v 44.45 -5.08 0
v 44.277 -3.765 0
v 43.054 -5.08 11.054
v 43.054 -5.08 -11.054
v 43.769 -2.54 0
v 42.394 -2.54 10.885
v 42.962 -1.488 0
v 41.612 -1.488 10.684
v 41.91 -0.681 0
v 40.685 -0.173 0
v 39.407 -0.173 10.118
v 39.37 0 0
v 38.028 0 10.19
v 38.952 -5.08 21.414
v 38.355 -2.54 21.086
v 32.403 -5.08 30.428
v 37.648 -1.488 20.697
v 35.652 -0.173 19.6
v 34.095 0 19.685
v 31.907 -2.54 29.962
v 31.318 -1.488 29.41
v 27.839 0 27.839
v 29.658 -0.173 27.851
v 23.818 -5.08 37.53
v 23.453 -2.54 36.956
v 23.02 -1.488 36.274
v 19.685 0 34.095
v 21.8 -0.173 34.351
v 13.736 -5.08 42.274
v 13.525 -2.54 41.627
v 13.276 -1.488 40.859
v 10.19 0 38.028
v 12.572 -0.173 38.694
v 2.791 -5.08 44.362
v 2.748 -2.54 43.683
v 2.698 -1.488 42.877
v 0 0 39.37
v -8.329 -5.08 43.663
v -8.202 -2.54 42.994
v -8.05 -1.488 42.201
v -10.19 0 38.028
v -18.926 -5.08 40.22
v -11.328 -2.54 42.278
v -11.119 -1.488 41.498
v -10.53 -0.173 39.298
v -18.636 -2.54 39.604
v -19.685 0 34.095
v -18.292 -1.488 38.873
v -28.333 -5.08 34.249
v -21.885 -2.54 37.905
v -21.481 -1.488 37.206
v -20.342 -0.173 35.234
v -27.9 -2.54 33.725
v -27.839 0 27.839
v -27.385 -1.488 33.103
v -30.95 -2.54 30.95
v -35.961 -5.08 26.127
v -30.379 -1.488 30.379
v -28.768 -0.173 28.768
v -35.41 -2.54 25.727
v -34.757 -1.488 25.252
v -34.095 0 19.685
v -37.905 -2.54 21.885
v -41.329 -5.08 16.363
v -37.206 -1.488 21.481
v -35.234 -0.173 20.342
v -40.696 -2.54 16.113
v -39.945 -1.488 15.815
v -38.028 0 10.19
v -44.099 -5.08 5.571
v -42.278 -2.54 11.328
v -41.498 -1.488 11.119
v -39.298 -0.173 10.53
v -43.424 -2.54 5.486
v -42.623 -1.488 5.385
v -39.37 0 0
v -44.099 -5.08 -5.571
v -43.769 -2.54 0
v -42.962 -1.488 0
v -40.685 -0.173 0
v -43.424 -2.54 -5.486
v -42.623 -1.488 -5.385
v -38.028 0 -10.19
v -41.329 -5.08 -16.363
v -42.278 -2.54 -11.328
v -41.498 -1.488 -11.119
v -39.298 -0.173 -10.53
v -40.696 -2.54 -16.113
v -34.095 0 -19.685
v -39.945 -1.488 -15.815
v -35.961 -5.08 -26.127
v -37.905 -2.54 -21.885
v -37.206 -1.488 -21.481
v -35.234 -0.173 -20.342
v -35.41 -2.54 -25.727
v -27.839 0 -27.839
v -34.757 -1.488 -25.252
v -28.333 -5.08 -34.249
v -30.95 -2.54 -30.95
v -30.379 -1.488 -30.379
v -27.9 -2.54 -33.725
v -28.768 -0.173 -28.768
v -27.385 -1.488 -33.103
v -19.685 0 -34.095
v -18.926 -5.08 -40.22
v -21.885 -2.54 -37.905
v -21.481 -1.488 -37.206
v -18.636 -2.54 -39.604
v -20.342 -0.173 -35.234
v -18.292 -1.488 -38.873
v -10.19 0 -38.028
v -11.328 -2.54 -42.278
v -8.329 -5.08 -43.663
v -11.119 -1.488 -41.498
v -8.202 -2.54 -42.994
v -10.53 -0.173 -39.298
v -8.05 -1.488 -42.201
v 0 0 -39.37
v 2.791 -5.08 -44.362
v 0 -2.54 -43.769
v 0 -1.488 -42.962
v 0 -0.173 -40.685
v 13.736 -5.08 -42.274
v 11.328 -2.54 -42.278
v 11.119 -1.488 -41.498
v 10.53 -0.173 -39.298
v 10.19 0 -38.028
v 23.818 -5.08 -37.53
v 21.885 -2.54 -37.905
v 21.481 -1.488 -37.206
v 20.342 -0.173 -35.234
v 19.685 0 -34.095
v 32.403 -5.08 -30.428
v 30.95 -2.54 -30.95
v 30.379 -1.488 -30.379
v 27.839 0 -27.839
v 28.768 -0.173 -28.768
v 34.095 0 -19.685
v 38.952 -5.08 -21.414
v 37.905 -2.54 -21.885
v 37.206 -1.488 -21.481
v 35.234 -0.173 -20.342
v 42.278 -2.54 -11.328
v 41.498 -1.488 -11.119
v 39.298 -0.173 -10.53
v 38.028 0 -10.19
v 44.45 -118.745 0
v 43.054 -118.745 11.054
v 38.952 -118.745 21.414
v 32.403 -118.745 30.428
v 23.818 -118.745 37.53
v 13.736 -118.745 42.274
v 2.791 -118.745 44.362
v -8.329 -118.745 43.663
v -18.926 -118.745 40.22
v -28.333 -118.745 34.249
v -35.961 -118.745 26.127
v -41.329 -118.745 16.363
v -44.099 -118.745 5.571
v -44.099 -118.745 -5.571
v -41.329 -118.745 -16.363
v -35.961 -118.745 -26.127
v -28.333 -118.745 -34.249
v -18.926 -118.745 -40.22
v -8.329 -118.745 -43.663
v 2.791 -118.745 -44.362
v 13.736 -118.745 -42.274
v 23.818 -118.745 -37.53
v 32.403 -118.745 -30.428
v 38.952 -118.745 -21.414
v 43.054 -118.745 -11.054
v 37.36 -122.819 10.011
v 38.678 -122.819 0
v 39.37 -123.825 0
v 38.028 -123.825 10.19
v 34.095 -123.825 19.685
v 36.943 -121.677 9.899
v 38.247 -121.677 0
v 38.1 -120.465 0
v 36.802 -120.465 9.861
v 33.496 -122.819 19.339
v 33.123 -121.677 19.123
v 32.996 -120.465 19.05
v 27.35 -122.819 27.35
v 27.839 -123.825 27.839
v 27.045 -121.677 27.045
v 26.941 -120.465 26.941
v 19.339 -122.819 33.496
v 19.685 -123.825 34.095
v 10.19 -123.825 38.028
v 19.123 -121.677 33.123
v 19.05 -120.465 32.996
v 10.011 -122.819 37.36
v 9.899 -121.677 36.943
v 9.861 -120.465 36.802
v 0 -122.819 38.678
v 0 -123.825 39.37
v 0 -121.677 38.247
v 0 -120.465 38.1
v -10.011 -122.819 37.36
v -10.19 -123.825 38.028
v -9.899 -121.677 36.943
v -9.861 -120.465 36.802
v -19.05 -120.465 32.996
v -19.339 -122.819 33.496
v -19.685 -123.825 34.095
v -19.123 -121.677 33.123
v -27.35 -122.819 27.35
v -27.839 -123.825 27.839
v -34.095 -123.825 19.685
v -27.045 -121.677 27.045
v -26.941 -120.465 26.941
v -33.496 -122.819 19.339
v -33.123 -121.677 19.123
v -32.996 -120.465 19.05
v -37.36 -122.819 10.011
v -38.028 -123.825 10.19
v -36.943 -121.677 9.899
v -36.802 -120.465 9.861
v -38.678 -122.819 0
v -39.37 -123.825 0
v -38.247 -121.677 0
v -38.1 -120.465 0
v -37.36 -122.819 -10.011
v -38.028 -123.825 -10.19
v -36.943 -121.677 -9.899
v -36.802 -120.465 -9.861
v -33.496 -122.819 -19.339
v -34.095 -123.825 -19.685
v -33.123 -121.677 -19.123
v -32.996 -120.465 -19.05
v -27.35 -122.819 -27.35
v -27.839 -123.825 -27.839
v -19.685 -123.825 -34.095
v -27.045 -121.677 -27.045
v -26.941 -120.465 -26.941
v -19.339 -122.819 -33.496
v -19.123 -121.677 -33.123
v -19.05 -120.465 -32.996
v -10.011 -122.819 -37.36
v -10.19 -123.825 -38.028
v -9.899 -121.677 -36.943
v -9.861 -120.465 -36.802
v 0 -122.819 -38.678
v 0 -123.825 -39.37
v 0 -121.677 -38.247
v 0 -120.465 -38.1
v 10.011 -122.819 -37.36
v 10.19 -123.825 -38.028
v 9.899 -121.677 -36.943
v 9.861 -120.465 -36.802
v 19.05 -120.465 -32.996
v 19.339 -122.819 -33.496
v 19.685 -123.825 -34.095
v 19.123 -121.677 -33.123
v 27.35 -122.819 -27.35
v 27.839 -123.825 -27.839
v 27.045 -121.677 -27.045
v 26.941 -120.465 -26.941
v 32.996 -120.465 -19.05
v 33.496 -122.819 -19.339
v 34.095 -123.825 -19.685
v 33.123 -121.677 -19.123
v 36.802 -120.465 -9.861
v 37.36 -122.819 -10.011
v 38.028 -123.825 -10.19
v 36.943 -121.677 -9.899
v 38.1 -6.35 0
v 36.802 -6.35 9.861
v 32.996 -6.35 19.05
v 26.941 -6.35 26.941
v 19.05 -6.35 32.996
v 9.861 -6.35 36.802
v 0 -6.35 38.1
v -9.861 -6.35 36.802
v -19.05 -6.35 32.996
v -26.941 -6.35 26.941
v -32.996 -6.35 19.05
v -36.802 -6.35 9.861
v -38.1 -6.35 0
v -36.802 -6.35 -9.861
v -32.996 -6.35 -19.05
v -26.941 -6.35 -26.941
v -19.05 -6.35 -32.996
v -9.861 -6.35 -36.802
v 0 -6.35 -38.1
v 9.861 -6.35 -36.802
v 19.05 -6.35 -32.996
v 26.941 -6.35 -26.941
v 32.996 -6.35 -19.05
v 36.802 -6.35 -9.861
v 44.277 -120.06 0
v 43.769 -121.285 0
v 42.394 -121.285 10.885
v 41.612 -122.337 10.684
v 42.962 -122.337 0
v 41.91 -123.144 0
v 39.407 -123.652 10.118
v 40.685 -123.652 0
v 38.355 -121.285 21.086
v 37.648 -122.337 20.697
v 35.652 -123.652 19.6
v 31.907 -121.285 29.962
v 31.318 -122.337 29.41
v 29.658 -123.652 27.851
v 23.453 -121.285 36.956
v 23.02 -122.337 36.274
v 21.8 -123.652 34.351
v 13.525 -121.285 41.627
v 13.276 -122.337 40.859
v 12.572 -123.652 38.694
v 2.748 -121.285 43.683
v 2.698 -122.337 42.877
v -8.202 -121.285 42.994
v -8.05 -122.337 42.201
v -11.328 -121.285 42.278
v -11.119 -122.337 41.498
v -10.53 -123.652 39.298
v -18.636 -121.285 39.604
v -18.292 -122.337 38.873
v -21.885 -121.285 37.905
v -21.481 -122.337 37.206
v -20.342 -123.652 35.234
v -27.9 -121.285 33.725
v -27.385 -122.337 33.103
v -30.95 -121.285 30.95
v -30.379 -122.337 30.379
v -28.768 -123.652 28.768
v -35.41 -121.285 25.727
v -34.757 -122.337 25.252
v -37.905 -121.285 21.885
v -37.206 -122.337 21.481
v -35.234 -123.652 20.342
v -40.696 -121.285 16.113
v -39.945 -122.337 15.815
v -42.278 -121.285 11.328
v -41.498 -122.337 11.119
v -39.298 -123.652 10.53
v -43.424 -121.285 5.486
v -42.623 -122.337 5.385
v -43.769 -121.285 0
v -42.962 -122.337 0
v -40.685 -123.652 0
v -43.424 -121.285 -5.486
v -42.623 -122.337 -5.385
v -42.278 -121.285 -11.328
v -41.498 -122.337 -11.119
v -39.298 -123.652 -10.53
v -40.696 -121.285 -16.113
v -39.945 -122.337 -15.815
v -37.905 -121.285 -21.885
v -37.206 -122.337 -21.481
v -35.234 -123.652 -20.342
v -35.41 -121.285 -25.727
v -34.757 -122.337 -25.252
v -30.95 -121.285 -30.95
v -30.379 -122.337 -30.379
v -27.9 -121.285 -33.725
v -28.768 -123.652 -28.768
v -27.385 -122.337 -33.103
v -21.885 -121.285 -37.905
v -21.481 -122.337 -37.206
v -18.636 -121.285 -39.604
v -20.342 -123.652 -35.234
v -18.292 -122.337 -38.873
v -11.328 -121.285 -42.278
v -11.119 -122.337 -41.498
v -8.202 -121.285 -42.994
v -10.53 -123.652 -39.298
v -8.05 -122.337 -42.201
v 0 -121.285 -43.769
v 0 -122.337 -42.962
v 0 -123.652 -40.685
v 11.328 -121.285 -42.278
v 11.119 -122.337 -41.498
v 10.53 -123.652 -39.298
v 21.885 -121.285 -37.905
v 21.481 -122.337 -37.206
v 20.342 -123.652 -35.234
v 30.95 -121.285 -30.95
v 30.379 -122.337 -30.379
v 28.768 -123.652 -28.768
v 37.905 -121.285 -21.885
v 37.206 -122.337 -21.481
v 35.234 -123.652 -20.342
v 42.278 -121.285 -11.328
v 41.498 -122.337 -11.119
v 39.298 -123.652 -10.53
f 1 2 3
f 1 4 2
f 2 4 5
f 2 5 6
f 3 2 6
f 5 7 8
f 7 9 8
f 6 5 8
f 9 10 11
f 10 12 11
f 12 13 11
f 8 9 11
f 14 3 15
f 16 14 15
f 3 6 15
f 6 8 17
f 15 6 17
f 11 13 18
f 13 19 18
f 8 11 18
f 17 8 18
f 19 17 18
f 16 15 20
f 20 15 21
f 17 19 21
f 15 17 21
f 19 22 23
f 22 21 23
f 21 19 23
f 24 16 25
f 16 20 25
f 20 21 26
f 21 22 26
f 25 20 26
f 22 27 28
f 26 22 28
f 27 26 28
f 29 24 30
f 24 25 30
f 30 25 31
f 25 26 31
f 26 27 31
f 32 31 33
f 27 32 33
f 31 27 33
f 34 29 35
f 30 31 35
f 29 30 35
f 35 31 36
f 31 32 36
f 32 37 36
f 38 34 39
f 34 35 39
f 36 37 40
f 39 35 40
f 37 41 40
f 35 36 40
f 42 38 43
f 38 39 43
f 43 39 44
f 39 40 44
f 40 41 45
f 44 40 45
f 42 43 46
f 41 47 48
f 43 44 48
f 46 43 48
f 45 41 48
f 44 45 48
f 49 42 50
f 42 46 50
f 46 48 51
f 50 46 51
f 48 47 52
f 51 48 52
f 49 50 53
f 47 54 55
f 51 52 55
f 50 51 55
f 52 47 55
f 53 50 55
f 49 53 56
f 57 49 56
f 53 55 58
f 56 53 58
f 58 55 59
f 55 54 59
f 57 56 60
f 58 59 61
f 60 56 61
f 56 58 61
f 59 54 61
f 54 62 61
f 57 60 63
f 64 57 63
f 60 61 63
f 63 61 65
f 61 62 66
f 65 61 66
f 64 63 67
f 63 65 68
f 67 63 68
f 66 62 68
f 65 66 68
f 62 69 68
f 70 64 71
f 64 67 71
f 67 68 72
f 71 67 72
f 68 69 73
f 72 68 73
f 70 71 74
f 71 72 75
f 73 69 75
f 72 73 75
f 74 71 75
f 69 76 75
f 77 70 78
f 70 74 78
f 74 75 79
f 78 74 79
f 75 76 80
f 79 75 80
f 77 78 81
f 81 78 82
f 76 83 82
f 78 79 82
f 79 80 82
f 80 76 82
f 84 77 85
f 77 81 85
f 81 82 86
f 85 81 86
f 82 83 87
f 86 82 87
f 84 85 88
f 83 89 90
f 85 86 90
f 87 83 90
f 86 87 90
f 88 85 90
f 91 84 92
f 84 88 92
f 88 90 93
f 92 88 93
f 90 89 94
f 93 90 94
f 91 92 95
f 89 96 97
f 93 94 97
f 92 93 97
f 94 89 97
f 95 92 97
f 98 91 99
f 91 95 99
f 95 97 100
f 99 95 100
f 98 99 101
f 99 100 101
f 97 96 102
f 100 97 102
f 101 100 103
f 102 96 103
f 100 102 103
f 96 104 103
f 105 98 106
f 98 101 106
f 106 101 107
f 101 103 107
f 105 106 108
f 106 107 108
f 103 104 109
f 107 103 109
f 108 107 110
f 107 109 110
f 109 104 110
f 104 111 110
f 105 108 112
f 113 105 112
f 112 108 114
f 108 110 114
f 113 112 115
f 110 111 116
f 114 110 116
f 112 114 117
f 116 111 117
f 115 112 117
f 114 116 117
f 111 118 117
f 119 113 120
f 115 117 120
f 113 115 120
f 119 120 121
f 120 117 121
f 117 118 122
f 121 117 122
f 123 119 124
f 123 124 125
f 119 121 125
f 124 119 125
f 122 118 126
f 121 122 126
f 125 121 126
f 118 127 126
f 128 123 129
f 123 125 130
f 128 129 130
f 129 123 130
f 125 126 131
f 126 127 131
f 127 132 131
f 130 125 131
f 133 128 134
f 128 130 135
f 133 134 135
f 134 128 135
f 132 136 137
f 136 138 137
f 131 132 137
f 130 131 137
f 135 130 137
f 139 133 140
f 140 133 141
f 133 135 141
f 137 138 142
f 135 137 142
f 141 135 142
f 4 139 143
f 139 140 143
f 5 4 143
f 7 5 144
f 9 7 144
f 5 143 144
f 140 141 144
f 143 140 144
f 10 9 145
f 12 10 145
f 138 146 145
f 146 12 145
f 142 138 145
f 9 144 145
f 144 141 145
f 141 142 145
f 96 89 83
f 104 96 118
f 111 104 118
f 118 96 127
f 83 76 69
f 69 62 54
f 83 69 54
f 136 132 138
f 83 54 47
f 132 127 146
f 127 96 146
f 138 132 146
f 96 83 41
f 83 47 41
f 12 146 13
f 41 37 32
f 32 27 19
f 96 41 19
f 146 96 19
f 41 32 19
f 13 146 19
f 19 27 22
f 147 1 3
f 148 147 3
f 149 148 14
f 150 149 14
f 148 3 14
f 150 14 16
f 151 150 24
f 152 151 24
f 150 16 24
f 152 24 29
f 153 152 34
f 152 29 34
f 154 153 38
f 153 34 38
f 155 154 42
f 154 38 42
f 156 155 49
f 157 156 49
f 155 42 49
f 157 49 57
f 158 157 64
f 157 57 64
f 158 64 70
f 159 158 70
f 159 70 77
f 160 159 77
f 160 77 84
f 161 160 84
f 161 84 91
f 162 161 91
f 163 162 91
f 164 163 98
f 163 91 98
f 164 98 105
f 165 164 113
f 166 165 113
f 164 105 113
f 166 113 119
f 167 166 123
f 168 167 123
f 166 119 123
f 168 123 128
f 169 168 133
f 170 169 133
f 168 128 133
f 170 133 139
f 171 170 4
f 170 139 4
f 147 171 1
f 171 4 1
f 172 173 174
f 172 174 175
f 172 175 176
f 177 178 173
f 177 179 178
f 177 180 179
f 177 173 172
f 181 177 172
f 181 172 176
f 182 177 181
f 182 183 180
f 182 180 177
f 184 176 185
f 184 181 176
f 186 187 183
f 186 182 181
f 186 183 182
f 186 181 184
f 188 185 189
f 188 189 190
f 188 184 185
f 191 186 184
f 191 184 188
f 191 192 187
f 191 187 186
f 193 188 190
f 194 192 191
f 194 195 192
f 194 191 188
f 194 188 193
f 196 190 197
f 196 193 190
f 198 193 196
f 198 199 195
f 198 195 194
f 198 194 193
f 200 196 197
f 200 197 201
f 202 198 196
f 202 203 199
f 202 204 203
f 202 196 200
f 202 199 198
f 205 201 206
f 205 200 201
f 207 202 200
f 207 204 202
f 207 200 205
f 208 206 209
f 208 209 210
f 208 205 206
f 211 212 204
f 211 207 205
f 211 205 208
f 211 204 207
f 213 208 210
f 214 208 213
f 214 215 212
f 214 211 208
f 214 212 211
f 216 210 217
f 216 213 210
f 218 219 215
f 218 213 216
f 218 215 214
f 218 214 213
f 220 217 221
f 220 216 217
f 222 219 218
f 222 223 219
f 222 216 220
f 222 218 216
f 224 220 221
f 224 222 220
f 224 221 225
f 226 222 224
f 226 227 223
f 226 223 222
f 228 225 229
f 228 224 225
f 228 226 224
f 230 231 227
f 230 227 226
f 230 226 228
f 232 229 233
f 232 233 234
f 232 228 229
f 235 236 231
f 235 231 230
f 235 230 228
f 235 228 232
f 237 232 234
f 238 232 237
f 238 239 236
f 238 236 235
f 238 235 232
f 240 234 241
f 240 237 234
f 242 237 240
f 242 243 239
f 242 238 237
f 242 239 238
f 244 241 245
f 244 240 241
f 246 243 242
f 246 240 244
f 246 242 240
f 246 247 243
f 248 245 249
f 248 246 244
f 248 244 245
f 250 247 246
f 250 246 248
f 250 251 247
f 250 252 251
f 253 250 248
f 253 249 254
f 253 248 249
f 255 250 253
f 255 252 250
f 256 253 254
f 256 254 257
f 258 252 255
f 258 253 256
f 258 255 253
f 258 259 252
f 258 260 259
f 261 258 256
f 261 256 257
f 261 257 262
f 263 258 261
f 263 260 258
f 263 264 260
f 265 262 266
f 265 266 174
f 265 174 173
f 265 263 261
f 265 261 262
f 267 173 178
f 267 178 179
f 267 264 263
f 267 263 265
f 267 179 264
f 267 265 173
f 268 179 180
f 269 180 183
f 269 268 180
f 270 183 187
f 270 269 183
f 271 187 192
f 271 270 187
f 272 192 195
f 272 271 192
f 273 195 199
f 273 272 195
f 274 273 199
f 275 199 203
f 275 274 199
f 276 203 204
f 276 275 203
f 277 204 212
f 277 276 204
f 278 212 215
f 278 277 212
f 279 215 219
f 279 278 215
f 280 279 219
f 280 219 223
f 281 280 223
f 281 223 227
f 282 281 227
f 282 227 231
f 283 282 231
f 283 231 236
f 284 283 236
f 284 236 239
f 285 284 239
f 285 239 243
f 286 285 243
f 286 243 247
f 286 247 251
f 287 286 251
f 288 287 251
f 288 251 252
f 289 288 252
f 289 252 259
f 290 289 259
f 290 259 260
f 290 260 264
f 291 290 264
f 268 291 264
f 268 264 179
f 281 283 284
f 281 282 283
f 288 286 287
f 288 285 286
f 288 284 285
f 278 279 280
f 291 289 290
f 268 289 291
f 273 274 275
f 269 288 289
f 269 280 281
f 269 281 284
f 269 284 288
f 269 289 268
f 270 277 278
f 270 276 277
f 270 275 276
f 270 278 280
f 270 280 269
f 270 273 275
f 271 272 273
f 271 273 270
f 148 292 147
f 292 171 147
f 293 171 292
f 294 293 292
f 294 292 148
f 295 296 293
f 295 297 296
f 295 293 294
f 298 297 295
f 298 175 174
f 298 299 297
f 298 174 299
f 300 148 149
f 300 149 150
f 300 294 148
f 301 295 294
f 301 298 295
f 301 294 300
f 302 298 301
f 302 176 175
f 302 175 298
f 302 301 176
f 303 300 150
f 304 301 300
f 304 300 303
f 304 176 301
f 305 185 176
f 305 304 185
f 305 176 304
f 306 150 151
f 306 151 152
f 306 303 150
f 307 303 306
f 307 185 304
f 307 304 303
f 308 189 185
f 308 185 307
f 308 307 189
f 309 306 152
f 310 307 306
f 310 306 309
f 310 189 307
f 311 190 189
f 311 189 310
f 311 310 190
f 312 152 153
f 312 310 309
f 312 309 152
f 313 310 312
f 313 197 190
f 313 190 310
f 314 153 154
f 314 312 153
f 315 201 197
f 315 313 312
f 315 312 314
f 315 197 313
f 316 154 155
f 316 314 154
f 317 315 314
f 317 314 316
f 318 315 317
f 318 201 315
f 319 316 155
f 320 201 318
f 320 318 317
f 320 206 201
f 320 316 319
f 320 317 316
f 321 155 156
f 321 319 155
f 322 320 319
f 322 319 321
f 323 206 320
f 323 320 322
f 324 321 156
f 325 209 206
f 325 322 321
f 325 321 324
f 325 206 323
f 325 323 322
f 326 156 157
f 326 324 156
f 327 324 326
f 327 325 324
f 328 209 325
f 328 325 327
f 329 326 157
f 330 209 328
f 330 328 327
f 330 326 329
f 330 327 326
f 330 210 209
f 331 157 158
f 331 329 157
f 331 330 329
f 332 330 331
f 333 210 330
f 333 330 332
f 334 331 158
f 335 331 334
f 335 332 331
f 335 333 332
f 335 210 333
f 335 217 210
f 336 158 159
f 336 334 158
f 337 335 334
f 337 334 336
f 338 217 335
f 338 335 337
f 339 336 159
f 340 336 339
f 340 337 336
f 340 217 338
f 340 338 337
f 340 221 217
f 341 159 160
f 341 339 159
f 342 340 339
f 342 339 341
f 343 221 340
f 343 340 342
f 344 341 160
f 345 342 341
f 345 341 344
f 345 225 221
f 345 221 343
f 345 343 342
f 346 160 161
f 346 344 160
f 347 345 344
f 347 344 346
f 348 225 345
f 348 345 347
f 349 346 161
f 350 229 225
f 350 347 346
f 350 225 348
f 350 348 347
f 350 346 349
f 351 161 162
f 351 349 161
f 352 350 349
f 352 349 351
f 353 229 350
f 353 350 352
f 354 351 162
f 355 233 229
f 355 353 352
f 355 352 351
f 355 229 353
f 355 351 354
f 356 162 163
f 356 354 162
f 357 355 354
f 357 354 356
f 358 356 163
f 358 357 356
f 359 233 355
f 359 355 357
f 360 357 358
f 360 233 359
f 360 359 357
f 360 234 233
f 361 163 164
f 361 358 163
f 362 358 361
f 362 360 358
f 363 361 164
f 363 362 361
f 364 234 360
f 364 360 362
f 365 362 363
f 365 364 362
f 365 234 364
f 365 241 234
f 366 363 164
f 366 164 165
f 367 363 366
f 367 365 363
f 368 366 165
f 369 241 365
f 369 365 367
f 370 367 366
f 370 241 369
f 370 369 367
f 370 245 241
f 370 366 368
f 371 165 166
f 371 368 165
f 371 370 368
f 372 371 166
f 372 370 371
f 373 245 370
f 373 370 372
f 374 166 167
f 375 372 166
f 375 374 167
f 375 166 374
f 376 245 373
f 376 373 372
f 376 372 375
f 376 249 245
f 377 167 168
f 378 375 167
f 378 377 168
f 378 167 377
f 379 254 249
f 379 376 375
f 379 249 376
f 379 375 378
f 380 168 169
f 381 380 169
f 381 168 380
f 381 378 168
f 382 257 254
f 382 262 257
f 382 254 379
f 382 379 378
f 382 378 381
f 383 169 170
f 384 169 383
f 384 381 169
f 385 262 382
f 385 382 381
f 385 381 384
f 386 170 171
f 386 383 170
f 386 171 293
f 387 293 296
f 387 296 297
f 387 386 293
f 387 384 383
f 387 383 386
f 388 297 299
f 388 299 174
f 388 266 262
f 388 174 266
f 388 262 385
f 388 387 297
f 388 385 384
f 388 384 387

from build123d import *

# Parameters (mm, degrees)
F0_R     = 44.45
F0_R_2   = 38.1
F1_DEPTH = 123.825
F2_R     = 44.45
F3_DEPTH = 6.35
F4_R     = 5.08


# Not quite as in the source:
# - a fillet or chamfer that OpenCascade refuses, or shapes differently, is made with other operations: its cross-section is extruded or revolved along the edge and cut away or added


with BuildPart() as f1:
    # F0 (on Front) → F1 (new body)
    with BuildSketch(Plane.XZ):
        Circle(F0_R)
        Circle(F0_R_2, mode=Mode.SUBTRACT)
    extrude(amount=F1_DEPTH)

    # F2 (on Front) → F3 (join)
    with BuildSketch(Plane.XZ):
        Circle(F2_R)
    extrude(amount=F3_DEPTH)

    # F4
    f4_edges = [f1.edges().sort_by_distance(p)[0] for p in [
        (-44.45, 0, 0),
        (44.45, -61.9125, 0),
        (-44.45, -123.825, 0),
    ]]
    fillet(f4_edges, radius=F4_R)

    # F5: fillet of radius 5.08 on 2 edges, made by hand

    # F5_s1 → F5_t2 (revolve, cut)
    with BuildSketch(Plane.XY):
        with BuildLine():
            ThreePointArc((39.37, -123.825), (38.4280951188, -122.2609470592), (38.1, -120.4648958349))
            Line((38.1, -120.4648958349), (38.1, -123.825))
            Line((38.1, -123.825), (39.37, -123.825))
        make_face()
    revolve(axis=Axis((0, -123.825, 0), (0, -1, 0)), mode=Mode.SUBTRACT)


solid = f1.part
